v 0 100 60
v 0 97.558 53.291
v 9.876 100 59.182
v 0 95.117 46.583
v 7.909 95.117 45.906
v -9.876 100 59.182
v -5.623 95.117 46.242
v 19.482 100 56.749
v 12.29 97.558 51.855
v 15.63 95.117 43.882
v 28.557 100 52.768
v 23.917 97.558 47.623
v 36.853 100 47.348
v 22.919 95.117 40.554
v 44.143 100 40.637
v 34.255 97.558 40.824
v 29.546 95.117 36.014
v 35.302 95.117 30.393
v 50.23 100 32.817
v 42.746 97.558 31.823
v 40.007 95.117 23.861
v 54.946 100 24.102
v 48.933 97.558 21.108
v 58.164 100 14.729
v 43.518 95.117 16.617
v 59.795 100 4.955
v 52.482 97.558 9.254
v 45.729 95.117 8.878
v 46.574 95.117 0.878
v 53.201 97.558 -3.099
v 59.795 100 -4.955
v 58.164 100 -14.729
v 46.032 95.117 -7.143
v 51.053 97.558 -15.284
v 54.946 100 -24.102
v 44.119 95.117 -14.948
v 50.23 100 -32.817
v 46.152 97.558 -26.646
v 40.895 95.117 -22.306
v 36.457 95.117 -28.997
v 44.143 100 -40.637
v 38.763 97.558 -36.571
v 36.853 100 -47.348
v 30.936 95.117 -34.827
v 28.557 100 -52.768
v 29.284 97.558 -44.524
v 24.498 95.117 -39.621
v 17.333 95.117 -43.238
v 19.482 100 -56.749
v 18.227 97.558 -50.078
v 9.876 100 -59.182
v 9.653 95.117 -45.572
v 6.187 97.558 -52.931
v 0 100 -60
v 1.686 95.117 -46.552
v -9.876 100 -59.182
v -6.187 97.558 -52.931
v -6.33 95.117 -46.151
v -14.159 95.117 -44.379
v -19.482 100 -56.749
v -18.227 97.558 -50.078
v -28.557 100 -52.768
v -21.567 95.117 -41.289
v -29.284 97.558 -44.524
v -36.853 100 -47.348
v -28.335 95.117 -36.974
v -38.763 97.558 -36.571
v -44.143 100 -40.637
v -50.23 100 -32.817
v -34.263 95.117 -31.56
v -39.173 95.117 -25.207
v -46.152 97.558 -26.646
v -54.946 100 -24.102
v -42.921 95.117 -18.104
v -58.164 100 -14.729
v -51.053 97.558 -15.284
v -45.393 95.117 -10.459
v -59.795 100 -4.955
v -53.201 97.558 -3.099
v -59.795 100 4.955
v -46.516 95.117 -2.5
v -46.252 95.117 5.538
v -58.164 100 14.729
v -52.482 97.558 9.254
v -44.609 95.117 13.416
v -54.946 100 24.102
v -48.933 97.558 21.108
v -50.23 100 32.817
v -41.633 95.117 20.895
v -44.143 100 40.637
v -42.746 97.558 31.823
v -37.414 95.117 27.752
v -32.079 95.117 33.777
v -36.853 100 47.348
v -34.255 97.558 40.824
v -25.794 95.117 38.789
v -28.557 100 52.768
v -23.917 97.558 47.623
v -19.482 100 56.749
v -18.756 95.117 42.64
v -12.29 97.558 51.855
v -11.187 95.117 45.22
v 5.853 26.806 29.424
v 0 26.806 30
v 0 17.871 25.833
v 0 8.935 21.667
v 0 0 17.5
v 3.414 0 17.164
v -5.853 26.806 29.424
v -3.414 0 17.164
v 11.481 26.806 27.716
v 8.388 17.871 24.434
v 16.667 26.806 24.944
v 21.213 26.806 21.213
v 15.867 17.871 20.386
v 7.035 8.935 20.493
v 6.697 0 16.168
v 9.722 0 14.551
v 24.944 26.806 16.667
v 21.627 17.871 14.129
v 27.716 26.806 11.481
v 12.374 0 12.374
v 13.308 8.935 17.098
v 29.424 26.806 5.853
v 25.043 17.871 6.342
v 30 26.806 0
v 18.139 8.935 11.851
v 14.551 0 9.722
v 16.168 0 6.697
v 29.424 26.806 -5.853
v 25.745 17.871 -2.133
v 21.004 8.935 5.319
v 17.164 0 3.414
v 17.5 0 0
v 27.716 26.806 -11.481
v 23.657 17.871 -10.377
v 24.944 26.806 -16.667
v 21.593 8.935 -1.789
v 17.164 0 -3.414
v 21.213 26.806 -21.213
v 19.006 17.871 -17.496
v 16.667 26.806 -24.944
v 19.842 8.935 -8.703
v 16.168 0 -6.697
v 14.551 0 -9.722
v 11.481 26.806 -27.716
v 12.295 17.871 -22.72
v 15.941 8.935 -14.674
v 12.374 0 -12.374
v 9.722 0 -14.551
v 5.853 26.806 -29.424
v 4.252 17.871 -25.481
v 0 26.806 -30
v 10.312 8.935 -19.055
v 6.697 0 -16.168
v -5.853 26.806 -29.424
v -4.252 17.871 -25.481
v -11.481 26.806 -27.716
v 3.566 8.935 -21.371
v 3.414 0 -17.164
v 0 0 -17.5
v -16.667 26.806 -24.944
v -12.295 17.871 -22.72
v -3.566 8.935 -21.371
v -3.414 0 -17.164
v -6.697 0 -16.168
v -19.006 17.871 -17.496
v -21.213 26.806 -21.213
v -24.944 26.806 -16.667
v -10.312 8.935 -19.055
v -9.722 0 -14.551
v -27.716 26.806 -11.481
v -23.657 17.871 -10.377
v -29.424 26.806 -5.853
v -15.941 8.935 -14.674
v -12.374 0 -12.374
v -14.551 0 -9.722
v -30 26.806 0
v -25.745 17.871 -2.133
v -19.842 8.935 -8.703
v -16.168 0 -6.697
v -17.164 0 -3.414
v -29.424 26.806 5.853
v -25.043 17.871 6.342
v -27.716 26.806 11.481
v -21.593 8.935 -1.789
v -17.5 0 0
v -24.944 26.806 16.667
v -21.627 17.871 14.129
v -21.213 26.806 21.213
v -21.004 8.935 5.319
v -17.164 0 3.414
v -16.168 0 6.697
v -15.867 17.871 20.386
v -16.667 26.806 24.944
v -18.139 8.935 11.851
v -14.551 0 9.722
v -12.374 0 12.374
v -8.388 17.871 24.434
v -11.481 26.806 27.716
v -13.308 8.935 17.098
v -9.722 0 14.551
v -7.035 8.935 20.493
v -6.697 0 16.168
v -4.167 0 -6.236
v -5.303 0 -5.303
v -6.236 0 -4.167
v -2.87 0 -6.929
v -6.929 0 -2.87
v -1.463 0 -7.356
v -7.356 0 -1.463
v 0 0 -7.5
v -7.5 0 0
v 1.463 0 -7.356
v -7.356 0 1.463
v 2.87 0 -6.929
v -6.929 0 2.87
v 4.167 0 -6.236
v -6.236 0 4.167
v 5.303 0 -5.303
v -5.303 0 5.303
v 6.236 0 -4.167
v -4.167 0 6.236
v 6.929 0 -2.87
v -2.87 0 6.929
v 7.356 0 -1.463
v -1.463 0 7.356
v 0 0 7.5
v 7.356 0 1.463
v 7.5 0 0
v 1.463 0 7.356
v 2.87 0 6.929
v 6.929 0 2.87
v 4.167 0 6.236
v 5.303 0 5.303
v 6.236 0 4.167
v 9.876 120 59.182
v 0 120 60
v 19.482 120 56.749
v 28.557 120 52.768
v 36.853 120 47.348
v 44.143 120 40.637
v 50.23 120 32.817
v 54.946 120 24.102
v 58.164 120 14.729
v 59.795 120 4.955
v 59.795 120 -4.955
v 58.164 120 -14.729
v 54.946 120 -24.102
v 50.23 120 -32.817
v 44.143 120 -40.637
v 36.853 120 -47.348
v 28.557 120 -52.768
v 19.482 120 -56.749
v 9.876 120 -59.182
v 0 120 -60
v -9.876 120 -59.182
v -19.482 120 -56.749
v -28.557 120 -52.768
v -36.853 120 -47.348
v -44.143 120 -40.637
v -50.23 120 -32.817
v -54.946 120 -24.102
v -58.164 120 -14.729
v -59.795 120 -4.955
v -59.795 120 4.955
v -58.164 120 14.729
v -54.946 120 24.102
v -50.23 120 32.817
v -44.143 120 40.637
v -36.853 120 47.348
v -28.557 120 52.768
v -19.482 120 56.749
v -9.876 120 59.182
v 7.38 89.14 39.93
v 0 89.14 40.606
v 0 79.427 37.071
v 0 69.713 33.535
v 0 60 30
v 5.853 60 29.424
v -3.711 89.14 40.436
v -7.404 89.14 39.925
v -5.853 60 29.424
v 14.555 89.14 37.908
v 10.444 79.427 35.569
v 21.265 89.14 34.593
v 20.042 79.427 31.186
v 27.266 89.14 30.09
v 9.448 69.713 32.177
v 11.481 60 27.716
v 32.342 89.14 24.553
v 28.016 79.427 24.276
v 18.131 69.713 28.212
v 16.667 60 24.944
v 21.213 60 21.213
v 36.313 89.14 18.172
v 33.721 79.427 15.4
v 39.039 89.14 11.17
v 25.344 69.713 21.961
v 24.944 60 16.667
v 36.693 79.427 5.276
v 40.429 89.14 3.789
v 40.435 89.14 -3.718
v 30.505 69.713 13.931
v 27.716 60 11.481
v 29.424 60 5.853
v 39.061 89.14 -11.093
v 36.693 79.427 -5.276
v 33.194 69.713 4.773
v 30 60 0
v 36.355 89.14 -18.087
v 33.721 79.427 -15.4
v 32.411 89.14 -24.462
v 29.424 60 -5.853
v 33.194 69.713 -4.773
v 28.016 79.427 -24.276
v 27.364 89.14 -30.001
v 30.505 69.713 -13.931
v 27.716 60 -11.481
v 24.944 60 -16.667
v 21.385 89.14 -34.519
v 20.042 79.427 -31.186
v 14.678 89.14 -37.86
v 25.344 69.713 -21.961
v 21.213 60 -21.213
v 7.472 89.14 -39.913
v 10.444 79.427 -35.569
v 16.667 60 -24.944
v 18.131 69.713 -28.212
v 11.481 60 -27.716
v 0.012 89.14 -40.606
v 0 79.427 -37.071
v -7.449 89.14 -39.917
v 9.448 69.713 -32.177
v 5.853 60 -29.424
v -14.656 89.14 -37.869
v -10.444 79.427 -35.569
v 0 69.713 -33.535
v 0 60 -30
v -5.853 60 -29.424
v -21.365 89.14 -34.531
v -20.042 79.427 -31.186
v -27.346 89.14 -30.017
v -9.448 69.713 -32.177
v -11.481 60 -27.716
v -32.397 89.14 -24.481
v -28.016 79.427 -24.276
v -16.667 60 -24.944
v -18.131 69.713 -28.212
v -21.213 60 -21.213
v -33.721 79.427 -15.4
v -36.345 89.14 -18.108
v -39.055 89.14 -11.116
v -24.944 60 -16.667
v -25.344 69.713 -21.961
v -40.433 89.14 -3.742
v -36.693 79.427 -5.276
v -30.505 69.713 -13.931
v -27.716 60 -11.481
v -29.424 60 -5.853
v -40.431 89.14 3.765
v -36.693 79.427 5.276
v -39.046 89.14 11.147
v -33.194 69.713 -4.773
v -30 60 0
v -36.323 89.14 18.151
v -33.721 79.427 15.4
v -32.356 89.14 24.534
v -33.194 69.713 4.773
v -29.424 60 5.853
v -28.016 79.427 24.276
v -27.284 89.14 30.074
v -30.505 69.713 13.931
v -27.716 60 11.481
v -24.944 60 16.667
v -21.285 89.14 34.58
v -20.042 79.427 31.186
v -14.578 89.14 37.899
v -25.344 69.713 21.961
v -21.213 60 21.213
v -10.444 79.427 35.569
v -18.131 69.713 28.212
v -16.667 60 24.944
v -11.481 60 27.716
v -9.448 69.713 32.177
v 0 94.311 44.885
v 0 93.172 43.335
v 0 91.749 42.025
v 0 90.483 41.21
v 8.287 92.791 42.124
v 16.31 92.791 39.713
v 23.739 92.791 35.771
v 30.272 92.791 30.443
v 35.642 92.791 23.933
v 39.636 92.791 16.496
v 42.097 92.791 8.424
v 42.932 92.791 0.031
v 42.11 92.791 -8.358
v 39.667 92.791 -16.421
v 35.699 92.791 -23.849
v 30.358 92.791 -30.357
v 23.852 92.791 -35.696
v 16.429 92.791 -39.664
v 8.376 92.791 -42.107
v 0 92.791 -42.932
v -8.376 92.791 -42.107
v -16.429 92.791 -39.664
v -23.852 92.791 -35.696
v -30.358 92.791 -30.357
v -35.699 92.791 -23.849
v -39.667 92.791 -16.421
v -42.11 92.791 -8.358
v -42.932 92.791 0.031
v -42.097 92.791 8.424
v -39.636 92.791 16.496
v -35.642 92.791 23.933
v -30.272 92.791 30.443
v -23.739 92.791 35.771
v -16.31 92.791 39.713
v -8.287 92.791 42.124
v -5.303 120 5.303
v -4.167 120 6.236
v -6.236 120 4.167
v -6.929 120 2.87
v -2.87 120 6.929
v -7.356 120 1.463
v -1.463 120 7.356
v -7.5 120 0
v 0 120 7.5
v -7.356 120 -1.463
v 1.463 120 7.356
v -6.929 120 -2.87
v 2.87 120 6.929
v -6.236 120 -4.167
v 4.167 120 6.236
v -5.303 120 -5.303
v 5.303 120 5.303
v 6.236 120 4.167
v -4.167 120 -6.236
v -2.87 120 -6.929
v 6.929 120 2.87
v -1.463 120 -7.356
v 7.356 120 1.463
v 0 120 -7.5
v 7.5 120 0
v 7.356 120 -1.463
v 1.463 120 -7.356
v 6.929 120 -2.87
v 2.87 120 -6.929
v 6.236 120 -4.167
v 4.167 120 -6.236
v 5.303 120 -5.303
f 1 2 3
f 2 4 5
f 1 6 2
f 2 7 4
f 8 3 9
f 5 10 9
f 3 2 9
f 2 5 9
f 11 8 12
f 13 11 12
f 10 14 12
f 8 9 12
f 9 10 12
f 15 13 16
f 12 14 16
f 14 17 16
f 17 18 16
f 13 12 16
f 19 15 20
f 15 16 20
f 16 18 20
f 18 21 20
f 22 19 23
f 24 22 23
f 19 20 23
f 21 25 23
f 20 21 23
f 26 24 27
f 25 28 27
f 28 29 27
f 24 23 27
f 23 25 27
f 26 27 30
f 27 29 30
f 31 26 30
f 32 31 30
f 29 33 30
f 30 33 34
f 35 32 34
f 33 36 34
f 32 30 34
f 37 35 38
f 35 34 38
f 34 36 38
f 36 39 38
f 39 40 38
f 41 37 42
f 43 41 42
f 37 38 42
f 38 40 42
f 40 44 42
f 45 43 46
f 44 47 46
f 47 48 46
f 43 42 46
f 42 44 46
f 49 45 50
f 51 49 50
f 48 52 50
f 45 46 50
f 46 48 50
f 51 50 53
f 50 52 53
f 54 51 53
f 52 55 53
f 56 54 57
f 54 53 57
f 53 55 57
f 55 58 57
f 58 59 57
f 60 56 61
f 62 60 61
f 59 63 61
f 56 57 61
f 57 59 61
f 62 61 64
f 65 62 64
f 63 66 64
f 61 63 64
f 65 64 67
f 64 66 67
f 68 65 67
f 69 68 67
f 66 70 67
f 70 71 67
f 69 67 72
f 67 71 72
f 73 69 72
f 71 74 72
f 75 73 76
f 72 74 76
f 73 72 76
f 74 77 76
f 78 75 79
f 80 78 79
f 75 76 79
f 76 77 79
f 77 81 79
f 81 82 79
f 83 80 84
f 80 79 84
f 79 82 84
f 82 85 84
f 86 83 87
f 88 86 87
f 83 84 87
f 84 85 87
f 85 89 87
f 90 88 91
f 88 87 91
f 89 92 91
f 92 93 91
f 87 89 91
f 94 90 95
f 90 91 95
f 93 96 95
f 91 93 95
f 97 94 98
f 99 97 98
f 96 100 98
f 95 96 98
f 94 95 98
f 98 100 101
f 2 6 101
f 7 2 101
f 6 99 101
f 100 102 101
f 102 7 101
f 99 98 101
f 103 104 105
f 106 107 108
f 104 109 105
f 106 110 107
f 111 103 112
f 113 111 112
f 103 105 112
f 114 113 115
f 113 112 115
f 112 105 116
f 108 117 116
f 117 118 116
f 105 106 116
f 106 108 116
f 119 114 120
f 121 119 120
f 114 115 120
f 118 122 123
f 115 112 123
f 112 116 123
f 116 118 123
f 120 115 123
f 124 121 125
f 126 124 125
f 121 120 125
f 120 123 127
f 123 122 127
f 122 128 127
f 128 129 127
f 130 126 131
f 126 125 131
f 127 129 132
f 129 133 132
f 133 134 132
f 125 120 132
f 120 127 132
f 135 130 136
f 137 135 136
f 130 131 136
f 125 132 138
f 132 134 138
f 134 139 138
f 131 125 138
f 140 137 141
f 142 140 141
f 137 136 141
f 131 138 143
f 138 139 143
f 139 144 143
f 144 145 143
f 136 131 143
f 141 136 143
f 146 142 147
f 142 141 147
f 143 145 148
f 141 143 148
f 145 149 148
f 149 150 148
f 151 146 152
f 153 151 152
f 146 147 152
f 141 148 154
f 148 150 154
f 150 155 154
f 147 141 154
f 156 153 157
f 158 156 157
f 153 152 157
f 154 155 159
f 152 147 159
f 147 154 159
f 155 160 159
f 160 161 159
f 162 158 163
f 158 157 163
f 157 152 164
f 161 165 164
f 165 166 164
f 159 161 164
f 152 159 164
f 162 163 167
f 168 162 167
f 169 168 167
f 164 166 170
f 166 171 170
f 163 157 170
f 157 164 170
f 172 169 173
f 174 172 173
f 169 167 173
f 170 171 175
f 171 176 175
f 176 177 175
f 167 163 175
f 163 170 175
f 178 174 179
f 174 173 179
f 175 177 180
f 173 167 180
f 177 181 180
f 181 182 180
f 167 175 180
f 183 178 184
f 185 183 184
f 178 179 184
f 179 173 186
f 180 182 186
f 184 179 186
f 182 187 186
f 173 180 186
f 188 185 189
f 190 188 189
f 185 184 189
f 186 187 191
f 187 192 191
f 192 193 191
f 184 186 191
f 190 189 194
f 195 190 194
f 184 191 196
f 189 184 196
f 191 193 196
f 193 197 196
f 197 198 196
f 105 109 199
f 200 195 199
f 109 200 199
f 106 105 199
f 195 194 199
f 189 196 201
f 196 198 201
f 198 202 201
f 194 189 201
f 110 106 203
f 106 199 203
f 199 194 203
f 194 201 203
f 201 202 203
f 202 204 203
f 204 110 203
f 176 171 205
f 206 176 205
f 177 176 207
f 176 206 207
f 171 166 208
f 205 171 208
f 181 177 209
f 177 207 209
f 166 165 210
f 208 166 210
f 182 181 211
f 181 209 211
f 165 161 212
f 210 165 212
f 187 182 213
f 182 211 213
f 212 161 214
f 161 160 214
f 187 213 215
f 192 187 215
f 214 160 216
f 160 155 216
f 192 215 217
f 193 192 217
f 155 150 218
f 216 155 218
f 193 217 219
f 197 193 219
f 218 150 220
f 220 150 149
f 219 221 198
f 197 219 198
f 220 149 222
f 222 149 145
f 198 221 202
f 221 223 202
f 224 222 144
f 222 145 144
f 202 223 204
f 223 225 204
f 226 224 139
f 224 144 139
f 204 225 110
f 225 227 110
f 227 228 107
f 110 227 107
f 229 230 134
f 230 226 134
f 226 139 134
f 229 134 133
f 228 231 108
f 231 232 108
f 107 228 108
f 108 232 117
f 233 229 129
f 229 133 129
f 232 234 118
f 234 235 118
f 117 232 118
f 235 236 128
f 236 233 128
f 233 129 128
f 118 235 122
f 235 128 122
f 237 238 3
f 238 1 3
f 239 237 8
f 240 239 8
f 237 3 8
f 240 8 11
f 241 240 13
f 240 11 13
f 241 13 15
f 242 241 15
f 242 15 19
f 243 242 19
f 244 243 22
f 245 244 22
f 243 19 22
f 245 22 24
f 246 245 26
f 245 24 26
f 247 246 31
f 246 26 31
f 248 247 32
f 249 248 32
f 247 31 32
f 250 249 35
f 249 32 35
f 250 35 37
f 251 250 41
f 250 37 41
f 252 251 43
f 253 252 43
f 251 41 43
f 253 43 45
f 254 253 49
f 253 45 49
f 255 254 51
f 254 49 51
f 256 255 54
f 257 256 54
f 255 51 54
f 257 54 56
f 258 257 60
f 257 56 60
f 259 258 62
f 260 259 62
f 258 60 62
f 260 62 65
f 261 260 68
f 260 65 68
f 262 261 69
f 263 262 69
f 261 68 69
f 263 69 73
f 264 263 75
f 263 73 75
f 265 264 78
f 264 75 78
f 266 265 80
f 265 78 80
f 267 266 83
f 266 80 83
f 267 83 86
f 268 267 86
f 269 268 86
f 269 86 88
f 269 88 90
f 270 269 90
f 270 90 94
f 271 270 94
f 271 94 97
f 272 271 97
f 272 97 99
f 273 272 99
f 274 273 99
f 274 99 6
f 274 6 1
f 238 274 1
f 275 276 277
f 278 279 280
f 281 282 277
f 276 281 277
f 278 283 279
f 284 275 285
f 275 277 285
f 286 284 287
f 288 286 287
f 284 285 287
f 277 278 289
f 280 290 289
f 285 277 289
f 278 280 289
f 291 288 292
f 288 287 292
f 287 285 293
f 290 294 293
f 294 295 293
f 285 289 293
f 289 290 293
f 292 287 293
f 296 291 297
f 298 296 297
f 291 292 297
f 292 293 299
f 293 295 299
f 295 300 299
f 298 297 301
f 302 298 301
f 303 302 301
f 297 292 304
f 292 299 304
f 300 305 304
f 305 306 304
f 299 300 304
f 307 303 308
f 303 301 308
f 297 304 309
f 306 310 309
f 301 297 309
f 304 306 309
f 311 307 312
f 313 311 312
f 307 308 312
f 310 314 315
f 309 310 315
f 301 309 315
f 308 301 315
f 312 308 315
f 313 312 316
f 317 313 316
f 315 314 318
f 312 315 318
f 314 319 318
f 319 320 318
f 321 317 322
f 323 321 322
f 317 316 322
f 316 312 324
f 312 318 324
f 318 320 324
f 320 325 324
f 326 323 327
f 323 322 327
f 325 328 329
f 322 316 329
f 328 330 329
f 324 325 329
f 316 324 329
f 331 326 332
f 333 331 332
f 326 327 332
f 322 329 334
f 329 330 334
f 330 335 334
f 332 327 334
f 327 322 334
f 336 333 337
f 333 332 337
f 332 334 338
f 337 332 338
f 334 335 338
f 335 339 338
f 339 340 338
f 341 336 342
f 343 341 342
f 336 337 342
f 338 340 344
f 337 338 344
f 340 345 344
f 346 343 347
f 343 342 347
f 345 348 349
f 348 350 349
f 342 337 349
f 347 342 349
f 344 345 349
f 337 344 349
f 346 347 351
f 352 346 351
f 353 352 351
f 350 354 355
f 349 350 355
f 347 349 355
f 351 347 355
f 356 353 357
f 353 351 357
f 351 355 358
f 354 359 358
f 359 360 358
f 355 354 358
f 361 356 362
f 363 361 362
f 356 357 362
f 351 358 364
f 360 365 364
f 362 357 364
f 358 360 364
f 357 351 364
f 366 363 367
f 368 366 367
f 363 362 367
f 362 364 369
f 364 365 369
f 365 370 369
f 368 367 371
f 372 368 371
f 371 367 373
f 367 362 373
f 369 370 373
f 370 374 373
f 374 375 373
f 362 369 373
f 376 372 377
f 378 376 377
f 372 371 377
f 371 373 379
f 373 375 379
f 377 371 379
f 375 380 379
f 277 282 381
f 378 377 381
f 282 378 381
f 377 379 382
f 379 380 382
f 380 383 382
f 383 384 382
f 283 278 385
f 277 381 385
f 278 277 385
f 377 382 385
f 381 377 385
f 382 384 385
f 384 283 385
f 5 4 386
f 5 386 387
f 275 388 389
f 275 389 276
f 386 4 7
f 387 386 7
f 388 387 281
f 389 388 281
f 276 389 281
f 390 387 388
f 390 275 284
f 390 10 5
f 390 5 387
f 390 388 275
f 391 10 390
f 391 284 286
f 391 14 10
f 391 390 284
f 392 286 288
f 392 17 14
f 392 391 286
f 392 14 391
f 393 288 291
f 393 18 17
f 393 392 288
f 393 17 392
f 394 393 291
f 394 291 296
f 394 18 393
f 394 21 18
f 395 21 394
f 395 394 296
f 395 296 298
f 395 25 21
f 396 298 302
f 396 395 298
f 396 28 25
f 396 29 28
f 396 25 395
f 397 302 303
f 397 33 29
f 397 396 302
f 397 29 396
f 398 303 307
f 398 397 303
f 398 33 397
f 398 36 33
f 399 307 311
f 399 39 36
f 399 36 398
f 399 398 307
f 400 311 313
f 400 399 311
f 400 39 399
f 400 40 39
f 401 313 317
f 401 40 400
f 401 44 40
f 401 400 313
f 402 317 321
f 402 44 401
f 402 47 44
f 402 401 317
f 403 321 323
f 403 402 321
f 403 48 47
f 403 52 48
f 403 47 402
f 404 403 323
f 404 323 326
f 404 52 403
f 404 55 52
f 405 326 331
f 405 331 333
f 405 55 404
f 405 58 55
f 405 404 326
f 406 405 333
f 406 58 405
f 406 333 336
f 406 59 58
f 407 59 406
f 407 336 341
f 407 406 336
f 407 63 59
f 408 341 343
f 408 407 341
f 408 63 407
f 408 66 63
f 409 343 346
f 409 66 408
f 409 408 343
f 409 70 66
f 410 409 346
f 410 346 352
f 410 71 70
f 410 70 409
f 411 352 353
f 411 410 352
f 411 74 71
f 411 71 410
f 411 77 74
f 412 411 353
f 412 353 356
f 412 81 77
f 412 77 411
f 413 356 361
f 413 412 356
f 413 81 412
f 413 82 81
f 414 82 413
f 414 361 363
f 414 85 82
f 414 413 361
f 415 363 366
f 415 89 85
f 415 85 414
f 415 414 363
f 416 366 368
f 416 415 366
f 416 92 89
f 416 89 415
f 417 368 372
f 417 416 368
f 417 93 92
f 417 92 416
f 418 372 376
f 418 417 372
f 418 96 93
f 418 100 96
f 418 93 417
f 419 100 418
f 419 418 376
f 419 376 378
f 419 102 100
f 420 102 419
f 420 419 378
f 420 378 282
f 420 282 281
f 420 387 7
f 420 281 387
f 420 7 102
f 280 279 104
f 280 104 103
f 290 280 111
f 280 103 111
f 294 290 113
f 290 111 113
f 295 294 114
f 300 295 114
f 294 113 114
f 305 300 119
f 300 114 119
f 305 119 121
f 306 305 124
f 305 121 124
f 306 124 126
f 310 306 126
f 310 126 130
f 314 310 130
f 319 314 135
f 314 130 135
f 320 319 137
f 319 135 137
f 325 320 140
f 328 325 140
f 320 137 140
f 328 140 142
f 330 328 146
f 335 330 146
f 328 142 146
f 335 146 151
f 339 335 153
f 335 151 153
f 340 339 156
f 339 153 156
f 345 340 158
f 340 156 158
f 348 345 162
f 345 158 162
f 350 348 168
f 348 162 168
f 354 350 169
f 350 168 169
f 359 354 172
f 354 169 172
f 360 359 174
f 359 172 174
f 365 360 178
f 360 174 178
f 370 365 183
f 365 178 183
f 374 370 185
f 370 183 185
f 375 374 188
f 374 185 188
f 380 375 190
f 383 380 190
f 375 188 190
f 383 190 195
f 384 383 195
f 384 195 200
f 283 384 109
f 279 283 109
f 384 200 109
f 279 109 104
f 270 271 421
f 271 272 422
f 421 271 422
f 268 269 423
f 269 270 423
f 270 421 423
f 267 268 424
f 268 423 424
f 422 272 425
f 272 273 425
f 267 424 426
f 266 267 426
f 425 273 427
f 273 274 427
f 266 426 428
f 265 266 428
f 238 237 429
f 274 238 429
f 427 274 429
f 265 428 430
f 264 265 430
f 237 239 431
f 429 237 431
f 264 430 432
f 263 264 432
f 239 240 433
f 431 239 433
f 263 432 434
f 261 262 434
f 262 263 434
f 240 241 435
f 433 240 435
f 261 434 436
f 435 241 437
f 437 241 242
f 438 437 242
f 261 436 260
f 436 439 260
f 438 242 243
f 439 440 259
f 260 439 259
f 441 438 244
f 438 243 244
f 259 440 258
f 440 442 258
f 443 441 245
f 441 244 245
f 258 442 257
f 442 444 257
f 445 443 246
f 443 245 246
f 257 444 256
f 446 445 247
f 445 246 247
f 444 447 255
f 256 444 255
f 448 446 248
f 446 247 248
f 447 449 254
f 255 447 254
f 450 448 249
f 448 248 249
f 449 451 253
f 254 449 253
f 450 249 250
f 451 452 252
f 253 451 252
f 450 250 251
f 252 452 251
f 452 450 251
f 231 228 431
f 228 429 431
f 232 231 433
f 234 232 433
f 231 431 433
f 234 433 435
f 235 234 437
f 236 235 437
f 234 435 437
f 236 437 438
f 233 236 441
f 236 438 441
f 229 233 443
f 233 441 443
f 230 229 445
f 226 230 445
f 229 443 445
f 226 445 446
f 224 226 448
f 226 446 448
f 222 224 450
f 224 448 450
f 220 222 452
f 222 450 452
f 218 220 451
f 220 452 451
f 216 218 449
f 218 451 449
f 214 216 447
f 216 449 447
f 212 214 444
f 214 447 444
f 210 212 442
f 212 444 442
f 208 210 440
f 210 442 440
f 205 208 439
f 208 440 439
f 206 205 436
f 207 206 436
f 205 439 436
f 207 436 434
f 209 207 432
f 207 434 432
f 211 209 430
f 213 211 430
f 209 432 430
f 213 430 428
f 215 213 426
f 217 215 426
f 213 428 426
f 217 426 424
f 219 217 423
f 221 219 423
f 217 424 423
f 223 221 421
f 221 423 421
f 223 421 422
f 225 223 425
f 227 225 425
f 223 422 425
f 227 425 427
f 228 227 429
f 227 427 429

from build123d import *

# Parameters (mm, degrees)
F2_R = 10


with BuildPart() as f1:
    # F0 (on Right) → F1 (revolve)
    with BuildSketch(Plane.YZ):
        Polygon((0, 17.5), (0, 7.5), (120, 7.5), (120, 60), (100, 60), (93.521651, 42.200883), (60, 30), (26.806337, 30), align=None)
    revolve(axis=Axis((0, 51.72596, 0), (0, 1, 0)))

    # F2
    f2_edges = [f1.edges().sort_by_distance(p)[0] for p in [
        (0, 93.521651, -42.200883),
    ]]
    fillet(f2_edges, radius=F2_R)


solid = f1.part
